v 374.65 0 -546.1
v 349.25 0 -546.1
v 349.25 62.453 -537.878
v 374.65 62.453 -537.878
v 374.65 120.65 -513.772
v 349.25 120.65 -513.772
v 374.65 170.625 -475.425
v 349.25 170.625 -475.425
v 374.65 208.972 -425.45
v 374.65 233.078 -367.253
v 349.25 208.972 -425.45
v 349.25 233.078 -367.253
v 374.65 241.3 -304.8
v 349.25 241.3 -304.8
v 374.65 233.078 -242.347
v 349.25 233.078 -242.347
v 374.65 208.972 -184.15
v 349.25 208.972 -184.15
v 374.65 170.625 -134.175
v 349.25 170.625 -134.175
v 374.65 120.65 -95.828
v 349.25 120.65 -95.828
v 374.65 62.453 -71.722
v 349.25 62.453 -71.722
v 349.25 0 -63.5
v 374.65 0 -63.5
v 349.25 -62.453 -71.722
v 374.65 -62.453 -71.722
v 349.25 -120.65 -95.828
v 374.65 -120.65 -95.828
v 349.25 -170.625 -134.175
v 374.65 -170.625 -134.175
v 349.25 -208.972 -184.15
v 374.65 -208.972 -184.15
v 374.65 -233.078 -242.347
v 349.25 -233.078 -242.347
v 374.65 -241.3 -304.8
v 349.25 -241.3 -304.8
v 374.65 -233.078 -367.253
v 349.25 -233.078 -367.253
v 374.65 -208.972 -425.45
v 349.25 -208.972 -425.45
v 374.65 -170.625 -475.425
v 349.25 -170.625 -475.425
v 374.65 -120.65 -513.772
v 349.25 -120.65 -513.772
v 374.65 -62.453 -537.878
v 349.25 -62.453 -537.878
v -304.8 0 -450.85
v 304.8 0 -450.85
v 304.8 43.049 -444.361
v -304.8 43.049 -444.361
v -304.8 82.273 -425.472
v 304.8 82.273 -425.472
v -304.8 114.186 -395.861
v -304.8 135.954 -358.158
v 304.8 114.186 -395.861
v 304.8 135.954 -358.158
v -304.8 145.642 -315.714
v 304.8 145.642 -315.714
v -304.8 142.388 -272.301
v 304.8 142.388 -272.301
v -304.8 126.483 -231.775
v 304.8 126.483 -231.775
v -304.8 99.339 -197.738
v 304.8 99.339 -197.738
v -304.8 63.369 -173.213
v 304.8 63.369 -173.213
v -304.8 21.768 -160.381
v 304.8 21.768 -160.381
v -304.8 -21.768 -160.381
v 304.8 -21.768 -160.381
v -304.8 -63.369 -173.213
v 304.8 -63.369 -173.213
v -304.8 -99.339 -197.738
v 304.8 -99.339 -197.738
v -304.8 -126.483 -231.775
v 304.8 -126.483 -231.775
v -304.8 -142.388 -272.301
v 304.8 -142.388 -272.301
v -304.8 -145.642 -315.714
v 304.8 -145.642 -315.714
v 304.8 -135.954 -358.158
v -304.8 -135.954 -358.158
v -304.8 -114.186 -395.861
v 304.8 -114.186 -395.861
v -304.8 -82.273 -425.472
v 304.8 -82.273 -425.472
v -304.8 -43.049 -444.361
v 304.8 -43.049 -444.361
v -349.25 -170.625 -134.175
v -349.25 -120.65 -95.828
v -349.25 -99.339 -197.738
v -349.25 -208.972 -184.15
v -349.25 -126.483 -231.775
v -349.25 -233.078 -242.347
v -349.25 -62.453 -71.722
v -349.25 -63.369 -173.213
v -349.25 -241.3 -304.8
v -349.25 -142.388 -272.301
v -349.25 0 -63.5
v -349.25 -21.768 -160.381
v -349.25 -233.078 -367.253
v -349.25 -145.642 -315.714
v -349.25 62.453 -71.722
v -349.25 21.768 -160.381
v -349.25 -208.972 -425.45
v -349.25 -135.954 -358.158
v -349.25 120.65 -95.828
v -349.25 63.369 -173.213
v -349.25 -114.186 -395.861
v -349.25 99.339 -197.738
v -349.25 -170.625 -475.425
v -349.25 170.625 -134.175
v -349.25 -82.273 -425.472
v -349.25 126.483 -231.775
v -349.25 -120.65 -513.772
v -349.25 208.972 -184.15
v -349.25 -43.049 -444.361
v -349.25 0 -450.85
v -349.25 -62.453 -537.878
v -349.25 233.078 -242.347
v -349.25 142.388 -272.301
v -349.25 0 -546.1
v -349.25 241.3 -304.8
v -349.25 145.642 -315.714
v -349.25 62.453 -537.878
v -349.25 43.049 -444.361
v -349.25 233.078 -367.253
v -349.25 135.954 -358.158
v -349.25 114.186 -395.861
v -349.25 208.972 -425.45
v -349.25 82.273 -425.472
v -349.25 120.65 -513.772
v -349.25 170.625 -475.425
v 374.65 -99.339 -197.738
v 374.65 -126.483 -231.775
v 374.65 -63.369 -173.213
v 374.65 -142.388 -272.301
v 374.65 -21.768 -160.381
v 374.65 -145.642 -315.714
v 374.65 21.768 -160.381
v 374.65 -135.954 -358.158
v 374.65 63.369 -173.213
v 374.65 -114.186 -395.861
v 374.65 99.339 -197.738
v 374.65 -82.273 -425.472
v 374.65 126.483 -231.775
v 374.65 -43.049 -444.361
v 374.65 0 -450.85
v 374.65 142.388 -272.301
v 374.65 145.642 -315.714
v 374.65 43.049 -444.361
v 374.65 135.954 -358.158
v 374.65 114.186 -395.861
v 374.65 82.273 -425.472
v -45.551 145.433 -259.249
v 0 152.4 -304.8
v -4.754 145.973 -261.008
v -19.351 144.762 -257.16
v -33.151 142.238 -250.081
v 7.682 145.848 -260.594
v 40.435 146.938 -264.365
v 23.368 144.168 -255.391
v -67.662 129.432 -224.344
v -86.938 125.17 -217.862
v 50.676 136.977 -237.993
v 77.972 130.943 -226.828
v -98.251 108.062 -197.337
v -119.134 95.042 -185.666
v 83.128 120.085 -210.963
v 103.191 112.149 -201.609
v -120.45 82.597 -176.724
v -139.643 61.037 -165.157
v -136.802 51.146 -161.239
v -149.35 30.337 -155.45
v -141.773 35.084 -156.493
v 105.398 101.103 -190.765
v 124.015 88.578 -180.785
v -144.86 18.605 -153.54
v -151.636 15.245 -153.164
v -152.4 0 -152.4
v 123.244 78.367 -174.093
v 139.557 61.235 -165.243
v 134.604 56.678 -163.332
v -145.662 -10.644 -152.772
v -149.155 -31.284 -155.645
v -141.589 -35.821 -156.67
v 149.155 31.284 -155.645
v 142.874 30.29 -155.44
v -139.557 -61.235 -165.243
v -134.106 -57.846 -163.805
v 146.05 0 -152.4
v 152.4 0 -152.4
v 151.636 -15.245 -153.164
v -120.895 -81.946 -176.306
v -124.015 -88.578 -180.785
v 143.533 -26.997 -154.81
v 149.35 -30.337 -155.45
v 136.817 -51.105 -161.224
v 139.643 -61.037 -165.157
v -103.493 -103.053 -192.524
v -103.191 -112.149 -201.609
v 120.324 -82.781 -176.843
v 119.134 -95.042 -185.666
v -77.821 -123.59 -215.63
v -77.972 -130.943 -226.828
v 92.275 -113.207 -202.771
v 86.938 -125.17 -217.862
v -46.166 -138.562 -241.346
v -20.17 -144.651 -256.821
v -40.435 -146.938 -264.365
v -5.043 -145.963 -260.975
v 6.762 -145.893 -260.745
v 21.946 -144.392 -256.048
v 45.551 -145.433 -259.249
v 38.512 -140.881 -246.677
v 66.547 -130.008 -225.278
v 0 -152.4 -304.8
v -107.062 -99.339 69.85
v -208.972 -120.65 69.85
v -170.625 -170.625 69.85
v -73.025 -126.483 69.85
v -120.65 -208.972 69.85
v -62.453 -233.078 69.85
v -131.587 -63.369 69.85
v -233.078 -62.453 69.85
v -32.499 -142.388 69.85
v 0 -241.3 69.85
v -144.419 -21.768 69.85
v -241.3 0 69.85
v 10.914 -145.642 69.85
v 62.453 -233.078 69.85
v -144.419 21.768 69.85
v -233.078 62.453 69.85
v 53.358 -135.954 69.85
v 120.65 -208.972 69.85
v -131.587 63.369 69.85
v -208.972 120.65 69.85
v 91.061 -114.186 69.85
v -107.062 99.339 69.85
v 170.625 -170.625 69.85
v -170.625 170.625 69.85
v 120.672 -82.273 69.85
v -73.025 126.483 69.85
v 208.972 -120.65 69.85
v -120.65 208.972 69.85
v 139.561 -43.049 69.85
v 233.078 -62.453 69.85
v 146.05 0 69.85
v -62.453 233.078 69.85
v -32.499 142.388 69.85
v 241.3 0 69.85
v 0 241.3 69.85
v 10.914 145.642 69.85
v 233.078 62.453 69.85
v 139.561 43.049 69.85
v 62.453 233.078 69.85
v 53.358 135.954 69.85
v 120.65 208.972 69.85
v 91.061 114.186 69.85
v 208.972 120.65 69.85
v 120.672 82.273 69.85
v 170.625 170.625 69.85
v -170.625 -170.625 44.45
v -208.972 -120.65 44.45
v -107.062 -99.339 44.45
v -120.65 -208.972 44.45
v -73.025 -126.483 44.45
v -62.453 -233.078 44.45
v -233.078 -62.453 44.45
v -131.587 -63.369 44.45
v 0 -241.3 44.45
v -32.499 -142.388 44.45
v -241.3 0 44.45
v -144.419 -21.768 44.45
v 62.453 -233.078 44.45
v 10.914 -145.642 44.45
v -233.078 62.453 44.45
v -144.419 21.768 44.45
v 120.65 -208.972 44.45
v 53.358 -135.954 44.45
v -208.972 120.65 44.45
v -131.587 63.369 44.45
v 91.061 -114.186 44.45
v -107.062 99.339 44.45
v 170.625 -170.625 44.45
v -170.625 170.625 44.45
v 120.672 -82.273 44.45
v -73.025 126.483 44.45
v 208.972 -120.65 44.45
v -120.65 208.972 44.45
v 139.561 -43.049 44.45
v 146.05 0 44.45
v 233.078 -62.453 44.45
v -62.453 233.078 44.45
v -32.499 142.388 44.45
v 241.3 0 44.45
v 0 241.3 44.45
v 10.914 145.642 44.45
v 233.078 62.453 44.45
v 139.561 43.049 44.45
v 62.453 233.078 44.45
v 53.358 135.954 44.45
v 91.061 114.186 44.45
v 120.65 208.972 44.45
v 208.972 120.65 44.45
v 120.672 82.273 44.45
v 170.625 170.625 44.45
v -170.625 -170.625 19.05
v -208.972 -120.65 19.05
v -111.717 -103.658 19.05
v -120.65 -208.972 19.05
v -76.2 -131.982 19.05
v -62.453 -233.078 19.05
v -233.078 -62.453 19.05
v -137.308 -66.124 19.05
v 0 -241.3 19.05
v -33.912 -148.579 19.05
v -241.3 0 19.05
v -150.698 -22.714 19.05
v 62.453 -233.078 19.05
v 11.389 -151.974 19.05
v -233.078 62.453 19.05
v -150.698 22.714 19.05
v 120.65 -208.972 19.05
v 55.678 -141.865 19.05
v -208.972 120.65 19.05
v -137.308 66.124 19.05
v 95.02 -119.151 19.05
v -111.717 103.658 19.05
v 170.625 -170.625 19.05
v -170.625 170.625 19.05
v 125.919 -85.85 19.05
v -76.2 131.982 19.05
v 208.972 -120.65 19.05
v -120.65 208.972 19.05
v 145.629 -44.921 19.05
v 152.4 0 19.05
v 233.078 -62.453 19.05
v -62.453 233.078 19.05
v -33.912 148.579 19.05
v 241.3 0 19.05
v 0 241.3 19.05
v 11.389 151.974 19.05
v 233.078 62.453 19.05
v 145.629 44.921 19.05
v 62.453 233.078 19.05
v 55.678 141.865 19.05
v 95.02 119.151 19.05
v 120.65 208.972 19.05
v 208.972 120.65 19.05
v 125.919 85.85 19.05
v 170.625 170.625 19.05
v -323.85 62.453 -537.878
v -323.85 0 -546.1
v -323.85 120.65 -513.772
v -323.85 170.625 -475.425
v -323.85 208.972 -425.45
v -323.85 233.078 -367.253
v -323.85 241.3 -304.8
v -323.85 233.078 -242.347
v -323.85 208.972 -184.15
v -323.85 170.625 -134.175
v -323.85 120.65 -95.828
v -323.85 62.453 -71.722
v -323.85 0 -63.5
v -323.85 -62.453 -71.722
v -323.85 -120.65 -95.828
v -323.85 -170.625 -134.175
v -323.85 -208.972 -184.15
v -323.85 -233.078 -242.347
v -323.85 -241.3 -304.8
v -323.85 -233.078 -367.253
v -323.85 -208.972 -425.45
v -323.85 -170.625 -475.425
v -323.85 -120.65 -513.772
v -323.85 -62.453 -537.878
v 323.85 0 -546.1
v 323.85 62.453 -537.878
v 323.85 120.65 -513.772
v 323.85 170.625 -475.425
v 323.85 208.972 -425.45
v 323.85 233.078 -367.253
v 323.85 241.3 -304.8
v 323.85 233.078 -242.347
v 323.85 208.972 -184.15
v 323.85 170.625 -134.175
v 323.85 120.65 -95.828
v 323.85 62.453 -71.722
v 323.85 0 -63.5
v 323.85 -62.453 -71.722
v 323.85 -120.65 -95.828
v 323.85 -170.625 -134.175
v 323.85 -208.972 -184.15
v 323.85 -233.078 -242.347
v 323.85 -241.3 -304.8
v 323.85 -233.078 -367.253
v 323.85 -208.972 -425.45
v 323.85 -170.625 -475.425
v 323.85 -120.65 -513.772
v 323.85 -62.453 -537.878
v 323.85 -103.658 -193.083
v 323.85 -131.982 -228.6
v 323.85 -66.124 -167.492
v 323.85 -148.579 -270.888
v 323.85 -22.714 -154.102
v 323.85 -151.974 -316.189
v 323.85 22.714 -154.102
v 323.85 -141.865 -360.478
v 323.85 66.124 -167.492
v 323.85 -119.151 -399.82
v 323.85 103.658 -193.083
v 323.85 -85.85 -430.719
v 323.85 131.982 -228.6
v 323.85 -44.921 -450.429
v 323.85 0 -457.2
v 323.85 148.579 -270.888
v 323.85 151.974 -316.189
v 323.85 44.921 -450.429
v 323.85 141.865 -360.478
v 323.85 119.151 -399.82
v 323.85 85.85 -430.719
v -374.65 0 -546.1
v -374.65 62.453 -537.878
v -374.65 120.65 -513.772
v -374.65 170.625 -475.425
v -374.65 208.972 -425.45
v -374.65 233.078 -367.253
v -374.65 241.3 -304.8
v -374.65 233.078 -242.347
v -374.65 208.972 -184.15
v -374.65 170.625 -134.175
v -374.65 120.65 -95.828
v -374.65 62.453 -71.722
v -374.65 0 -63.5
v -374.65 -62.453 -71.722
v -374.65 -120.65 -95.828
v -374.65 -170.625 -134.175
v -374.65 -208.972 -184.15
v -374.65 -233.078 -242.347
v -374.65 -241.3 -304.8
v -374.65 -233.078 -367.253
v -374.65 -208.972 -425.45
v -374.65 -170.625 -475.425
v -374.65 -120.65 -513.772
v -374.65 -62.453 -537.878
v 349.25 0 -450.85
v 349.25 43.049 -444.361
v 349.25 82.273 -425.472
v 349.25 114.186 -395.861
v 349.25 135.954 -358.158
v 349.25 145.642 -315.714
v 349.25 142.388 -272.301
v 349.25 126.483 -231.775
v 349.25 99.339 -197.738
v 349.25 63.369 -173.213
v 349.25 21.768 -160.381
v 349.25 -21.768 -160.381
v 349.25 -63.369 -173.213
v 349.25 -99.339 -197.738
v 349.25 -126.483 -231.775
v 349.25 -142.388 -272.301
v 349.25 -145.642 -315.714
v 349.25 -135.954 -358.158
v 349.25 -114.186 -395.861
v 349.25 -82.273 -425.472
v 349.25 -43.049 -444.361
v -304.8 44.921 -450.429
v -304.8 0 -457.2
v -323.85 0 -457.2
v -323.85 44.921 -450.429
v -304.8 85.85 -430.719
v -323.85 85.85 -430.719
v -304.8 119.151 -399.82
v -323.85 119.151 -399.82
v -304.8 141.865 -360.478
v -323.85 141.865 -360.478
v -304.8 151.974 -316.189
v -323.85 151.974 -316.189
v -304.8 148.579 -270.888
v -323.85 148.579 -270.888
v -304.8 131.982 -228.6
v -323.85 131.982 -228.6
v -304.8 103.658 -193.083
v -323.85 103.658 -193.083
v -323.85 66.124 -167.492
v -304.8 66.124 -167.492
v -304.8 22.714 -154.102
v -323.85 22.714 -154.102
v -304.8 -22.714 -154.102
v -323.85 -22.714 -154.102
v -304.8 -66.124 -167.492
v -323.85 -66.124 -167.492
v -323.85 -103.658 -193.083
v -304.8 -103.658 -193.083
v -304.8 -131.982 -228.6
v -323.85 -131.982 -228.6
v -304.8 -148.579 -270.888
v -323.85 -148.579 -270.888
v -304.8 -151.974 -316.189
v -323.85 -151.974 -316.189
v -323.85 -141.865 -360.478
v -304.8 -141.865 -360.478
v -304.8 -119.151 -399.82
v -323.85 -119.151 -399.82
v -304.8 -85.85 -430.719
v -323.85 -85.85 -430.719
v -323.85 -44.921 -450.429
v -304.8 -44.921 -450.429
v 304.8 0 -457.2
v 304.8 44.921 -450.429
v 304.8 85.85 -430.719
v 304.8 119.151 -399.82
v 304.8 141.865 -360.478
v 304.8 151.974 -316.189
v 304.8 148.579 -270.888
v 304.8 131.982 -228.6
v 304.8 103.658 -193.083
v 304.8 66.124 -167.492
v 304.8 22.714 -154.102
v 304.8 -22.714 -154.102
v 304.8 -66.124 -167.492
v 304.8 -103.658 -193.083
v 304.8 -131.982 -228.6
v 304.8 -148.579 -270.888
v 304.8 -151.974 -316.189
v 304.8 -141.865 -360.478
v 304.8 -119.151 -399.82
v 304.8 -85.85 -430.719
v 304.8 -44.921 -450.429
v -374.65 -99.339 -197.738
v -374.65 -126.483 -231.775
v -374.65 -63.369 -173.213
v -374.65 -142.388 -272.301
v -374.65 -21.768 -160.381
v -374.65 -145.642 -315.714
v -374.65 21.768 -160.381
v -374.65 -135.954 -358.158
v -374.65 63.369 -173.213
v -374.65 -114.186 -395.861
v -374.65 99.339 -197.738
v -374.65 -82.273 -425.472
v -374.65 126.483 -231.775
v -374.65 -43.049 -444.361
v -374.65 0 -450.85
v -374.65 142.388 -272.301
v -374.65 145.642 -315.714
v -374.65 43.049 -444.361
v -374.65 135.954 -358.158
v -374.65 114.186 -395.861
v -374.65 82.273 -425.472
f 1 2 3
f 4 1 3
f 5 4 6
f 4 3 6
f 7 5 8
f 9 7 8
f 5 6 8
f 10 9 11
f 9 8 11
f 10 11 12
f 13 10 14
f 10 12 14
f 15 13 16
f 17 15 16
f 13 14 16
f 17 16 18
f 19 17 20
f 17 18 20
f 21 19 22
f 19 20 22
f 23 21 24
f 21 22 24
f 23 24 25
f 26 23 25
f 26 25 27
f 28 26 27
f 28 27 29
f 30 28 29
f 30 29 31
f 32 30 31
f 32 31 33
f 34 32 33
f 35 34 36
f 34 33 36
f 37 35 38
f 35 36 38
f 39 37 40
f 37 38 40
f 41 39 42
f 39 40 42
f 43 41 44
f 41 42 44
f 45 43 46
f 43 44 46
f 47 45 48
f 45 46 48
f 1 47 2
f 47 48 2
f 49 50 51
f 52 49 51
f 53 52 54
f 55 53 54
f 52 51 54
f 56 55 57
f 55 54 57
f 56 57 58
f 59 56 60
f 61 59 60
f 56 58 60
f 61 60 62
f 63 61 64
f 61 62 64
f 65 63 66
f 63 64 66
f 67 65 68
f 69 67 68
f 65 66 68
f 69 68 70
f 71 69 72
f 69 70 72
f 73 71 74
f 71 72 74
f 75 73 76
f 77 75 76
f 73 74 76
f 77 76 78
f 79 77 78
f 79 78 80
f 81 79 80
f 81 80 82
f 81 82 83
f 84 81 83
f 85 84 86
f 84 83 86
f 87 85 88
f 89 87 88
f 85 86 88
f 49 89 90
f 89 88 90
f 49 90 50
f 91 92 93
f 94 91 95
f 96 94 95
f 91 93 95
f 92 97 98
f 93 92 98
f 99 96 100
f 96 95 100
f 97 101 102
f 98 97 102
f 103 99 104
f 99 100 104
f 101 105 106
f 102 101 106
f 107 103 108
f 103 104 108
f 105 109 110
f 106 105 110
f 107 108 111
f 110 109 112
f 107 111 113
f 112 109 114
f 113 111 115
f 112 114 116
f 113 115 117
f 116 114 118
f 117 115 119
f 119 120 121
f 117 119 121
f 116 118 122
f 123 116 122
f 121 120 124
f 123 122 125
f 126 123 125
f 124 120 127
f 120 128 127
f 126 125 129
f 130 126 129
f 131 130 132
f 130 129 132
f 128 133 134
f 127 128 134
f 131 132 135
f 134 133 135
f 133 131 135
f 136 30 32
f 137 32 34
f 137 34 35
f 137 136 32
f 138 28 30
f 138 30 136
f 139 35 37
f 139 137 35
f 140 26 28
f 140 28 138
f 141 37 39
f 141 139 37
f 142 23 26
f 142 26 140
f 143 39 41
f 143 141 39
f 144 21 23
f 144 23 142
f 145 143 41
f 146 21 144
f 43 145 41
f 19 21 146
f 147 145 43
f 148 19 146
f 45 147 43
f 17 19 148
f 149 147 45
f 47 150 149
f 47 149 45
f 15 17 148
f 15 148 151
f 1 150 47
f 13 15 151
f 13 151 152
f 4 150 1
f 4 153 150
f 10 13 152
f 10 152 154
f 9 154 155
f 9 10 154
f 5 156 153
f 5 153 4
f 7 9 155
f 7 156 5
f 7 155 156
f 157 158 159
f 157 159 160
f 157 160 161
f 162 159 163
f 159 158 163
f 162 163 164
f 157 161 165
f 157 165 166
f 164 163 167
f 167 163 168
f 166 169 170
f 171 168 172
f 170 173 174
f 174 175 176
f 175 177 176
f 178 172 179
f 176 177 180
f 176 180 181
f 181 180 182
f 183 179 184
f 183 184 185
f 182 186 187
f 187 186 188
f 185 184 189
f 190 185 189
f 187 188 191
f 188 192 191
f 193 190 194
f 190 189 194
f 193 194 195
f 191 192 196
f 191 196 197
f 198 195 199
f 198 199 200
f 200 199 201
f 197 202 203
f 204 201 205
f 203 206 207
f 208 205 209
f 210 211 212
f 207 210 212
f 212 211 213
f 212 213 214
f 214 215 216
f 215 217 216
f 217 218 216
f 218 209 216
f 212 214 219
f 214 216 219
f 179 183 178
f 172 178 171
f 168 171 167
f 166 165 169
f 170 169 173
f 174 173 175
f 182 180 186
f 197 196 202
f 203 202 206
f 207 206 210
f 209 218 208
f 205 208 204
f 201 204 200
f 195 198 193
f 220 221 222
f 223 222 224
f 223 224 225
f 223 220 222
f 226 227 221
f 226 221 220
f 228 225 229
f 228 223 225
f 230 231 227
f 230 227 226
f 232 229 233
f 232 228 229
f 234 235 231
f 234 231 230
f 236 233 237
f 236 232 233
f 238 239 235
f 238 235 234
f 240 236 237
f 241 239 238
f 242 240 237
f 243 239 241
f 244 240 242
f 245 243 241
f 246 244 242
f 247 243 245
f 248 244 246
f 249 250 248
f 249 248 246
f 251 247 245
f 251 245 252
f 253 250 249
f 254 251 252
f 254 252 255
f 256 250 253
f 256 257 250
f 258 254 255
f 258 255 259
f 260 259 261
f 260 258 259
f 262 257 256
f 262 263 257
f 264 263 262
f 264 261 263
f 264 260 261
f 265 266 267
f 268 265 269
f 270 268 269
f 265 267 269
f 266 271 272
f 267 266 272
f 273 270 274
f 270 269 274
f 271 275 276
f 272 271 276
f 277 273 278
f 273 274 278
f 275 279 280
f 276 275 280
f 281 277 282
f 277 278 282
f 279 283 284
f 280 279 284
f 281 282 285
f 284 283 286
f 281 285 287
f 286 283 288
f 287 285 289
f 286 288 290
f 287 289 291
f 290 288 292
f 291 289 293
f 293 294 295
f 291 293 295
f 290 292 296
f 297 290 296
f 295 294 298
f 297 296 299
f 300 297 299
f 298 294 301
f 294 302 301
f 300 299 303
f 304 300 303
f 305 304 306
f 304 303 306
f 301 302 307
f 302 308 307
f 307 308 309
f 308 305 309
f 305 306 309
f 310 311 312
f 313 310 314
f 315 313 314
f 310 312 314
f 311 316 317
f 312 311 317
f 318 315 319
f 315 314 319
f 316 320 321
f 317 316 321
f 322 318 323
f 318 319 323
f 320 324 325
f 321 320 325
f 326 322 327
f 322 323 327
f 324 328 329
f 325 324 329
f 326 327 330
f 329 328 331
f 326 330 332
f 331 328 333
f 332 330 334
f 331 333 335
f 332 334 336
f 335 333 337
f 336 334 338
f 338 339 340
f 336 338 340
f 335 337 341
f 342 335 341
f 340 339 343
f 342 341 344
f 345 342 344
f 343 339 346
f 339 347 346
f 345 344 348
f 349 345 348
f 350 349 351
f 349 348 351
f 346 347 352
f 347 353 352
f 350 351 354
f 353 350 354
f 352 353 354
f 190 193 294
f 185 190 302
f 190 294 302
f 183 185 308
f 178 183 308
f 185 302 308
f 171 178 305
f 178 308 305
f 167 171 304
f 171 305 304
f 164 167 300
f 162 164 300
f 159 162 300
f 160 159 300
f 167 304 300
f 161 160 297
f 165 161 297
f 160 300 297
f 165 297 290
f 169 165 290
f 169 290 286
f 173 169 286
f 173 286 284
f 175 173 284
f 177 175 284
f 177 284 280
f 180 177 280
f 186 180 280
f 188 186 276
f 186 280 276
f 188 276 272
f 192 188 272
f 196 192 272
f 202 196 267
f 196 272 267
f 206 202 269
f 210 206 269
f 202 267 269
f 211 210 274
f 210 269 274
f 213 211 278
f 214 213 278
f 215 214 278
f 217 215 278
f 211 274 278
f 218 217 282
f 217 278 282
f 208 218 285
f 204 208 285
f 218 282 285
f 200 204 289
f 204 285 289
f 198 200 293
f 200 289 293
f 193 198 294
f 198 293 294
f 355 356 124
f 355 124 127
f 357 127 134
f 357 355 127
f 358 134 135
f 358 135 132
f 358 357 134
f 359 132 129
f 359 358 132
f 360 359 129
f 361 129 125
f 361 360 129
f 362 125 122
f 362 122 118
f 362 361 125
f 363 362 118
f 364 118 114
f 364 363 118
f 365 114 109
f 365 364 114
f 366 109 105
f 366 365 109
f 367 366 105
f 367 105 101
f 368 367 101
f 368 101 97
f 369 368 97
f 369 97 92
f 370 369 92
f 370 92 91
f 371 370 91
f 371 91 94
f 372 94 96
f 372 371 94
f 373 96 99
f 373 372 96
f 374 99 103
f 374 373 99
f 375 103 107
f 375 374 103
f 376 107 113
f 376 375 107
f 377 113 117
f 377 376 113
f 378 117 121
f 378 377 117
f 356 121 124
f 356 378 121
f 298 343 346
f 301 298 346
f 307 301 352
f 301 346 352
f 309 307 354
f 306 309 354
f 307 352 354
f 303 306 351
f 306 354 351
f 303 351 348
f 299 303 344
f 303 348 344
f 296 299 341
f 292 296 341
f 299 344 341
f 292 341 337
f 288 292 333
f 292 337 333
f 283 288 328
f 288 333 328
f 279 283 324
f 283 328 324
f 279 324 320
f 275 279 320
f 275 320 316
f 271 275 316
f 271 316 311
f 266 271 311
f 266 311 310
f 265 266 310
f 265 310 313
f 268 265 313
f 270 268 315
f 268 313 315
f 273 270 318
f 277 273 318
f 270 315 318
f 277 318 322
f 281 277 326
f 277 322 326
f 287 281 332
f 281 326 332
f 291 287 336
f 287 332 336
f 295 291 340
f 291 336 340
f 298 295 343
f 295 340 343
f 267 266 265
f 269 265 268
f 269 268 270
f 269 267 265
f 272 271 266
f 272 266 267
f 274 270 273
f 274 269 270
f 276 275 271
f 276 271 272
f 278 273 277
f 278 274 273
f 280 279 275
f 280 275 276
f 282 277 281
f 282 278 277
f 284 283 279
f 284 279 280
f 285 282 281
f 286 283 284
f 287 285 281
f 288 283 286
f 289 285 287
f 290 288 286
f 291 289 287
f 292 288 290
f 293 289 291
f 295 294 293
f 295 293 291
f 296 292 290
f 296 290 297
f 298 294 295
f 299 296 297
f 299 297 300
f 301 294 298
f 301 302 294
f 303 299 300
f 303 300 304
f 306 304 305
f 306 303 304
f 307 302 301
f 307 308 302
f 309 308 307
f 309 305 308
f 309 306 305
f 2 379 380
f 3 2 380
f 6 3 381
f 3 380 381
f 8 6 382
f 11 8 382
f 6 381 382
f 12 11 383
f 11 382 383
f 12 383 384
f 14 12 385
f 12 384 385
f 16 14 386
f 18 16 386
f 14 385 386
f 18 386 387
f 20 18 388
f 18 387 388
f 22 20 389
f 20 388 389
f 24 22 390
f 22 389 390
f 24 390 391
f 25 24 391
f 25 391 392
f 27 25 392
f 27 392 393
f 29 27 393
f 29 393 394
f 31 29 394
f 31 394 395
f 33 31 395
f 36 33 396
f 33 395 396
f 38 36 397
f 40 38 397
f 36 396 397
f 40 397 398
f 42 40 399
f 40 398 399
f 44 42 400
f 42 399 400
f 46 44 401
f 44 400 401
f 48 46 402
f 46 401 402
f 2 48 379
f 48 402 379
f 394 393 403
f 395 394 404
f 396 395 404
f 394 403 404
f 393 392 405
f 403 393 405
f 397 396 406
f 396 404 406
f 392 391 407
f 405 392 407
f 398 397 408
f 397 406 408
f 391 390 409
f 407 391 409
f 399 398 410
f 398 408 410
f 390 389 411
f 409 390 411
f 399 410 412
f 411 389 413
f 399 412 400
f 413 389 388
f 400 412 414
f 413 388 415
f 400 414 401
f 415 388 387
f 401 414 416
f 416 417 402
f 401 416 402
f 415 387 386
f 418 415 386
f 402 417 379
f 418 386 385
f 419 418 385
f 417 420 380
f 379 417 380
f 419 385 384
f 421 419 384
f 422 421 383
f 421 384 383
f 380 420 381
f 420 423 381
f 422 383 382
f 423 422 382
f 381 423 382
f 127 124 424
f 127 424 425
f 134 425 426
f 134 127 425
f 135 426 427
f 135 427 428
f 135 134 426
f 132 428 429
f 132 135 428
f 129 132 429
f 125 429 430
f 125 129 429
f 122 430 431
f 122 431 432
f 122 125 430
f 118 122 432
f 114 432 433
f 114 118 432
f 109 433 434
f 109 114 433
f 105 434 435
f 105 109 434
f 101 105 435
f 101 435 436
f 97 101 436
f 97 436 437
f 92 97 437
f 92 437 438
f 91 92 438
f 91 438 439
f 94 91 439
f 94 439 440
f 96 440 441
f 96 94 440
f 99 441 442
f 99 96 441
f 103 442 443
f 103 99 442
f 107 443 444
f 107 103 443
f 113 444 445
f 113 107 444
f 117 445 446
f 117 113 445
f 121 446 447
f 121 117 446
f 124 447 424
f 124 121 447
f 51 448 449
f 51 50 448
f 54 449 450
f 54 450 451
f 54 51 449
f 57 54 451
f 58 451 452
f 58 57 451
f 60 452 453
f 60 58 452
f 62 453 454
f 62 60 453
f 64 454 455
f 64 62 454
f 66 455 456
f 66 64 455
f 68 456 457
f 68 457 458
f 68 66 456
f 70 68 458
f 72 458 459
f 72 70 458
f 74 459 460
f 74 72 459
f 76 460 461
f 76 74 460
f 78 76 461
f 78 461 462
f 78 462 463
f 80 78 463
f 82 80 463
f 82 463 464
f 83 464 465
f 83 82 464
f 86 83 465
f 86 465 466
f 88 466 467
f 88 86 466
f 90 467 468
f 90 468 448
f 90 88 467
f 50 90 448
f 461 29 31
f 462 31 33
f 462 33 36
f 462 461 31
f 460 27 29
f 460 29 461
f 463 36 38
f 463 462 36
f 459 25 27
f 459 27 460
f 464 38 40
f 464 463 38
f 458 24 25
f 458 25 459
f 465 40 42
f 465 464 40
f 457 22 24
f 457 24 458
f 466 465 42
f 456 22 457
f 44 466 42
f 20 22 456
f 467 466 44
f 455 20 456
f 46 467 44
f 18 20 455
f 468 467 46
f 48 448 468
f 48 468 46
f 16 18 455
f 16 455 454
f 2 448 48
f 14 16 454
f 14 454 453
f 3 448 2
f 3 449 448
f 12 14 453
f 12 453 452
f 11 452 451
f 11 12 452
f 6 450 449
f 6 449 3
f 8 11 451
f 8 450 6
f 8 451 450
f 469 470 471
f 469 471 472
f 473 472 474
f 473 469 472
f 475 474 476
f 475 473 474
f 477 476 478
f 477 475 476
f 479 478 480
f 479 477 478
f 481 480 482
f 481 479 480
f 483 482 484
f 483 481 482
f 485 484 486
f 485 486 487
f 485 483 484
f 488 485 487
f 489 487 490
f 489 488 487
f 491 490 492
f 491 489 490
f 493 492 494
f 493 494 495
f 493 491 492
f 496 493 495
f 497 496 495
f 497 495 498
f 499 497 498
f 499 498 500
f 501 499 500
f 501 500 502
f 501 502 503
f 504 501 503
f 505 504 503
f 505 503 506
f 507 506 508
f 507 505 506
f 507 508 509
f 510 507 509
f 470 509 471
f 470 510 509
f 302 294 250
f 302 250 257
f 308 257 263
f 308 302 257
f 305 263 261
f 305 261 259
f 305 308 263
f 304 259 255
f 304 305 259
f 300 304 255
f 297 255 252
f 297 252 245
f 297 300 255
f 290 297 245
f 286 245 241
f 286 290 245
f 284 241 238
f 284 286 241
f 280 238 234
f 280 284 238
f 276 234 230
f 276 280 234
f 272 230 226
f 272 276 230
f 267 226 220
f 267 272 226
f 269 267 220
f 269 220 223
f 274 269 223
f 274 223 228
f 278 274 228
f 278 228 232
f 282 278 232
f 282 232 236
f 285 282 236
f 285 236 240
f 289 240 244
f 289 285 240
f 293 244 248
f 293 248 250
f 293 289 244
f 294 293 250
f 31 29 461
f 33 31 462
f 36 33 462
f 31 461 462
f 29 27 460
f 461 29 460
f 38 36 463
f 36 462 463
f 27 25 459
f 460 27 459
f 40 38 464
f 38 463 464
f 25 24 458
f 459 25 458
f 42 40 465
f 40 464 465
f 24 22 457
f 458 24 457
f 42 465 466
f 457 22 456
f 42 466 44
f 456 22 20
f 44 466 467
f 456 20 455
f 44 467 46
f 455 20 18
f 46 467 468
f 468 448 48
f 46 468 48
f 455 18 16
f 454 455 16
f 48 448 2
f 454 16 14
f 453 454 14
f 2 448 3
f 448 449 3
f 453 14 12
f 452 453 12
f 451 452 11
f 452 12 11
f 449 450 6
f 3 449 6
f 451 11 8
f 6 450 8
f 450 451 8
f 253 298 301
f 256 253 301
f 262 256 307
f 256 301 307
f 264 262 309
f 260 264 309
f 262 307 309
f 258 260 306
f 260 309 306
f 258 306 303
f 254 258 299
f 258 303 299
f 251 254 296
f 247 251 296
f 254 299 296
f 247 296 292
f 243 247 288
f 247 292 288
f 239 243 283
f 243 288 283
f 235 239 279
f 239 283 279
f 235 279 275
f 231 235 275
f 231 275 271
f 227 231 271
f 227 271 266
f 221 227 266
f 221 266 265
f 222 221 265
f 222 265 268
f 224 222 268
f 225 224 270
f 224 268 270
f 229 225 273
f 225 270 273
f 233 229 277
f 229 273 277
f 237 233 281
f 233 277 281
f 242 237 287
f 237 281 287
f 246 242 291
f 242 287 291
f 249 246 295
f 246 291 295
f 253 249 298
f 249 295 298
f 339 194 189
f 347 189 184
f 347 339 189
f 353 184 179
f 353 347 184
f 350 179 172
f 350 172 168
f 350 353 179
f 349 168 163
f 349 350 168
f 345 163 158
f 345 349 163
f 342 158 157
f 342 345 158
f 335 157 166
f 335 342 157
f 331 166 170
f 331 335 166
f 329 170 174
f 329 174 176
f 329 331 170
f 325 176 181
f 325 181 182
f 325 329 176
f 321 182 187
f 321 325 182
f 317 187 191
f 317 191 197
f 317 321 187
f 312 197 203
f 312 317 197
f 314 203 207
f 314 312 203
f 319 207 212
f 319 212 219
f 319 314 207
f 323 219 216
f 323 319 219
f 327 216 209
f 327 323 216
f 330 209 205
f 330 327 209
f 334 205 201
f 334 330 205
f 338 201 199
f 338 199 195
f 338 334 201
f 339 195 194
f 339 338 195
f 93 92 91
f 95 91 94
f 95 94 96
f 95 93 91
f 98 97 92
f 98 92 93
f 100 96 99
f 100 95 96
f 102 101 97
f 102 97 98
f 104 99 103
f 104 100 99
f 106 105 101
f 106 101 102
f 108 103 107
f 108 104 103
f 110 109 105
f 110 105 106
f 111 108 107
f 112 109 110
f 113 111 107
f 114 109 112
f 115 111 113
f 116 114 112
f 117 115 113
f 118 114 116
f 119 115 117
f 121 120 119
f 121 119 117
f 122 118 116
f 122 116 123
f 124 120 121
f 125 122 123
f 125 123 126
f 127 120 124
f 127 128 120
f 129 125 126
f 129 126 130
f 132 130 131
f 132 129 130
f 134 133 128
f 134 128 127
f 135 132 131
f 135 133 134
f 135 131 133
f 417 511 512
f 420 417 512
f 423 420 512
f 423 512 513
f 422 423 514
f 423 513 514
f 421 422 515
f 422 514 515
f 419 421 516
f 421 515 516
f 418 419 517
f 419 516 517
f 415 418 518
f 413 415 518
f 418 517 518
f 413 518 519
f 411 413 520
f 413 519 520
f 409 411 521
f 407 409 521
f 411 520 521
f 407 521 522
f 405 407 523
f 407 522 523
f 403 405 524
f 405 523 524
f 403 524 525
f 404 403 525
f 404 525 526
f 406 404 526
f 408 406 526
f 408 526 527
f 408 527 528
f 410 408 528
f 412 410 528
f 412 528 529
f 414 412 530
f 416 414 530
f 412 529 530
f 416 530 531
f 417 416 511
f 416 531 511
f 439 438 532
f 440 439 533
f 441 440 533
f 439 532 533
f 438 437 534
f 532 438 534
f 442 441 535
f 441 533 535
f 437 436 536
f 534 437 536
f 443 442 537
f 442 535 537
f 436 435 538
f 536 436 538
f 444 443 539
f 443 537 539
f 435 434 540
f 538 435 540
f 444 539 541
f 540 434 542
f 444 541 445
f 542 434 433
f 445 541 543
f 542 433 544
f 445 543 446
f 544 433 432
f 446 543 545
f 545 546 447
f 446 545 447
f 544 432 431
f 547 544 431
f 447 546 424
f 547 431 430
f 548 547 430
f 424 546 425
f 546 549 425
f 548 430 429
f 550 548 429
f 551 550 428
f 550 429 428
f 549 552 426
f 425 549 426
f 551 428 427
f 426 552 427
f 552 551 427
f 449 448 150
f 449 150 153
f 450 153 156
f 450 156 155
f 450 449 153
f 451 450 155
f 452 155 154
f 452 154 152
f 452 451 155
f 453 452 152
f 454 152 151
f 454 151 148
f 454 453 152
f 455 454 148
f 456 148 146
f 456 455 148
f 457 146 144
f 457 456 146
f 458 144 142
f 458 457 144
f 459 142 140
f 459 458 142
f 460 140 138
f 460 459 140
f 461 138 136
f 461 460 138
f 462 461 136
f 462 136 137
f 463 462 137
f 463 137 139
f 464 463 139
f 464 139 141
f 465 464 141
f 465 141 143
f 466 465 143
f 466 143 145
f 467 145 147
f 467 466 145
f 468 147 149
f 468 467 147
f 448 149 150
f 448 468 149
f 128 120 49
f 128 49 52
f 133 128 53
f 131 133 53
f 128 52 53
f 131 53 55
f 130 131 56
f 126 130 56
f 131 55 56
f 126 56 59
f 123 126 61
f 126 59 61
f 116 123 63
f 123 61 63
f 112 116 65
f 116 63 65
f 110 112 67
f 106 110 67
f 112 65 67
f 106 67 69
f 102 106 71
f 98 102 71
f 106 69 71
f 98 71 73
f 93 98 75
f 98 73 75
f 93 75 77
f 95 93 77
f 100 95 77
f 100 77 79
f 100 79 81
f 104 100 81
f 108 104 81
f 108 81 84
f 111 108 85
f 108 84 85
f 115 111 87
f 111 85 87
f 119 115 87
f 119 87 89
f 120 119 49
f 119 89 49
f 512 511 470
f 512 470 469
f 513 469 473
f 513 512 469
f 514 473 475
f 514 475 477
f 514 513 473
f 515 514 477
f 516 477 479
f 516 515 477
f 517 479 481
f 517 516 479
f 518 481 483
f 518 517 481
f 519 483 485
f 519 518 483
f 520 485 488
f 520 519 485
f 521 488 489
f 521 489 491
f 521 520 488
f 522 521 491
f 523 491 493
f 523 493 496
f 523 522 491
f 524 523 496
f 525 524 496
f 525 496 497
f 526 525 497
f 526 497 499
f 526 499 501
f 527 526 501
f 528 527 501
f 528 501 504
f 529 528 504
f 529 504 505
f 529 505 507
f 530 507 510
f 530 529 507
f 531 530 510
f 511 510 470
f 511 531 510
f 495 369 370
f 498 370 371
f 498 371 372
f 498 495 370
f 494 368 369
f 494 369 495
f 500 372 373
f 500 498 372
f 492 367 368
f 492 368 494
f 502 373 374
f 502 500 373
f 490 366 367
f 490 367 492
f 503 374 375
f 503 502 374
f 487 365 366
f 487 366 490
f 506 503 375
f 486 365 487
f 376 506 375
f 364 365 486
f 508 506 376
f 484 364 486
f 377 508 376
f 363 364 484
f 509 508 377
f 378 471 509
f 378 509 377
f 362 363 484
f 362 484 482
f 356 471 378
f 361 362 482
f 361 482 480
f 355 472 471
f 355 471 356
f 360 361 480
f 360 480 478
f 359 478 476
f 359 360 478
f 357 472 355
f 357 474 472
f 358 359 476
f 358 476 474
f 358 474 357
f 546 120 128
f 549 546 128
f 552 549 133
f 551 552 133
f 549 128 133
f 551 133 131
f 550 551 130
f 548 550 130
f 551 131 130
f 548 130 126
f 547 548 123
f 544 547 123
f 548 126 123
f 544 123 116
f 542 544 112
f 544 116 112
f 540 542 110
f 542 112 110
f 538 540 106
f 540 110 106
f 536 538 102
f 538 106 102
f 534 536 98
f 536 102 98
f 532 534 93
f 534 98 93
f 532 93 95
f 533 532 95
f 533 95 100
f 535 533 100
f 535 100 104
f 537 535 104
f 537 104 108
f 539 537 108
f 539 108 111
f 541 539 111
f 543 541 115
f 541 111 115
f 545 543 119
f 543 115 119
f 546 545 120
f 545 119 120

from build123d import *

# Parameters (mm, degrees)
F0_R      = 152.4
F0_R_2    = 146.05
F1_DEPTH  = 19.05
F2_R      = 241.3
F2_R_2    = 152.4
F2_R_3    = 146.05
F3_DEPTH  = 25.4
F9_ANGLE  = 90
F11_DEPTH = 609.6
F12_REACH = 977.1532938113
F13_DEPTH = 25.4
F14_DEPTH = 25.4
F15_DEPTH = 25.4


with BuildPart() as f1:
    # F0 (on Top) → F1 (new body)
    with BuildSketch(Plane.XY):
        Circle(F0_R)
        Circle(F0_R_2, mode=Mode.SUBTRACT)
    extrude(amount=F1_DEPTH)

    # F2 (on face) → F3 (join)
    with BuildSketch(Plane.XY.offset(19.05)):
        Circle(F2_R)
        Circle(F2_R_2, mode=Mode.SUBTRACT)
        Circle(F2_R_2)
        Circle(F2_R_3, mode=Mode.SUBTRACT)
    extrude(amount=F3_DEPTH)


with BuildPart() as f7_1:
    # F7: copy of F1
    add(f1.part.moved(Location((304.8, 0, -304.8))))


with BuildPart() as f7_1_1:
    # F9: moved
    add(f7_1.part.rotate(Axis((304.8, 122.1911609173, -304.8), (0, 1, 0)), F9_ANGLE))


with BuildPart() as f10_1:
    # F10: instance of F7_1
    add(f7_1_1.part.mirror(Plane.YZ))


with BuildPart() as f7_1_2:
    add(f7_1_1.part)

    # F11 (add, through all): a face of the model
    f11_faces = [f7_1_2.faces().sort_by_distance(p)[0] for p in [
        (304.8, 0, -156.7105229381),
    ]]

    add(f10_1.part)  # F11 merges F10_1
    extrude(f11_faces, amount=F11_DEPTH)


with BuildPart() as f1_1:
    add(f1.part)

    f12_end = f7_1_2.part.faces().sort_by_distance((0, 0, -152.4))[0]
    # F0 (on Top) → F12 (join, up to a face of F7_1 that its end follows)
    with BuildSketch(Plane.XY):
        Circle(F0_R)
        Circle(F0_R_2, mode=Mode.SUBTRACT)
    f12_long = extrude(amount=-F12_REACH, mode=Mode.PRIVATE)
    add(split(f12_long, bisect_by=f12_end, keep=Keep.ALL, mode=Mode.PRIVATE).solids().sort_by_distance((-148.0894770619, 0, 0))[0])


with BuildPart() as f13:
    # F13 (new): a face of the model
    f13_faces = [f7_1_2.part.faces().sort_by_distance(p)[0] for p in [
        (349.25, 0, -70.324994652),
    ]]
    extrude(f13_faces, amount=F13_DEPTH)


with BuildPart() as f14:
    # F14 (new): a face of the model
    f14_faces = [f7_1_2.part.faces().sort_by_distance(p)[0] for p in [
        (-349.25, 0, -70.324994652),
    ]]
    extrude(f14_faces, amount=F14_DEPTH)


with BuildPart() as f15:
    # F15 (new): a face of the model
    f15_faces = [f1_1.part.faces().sort_by_distance(p)[0] for p in [
        (-234.475005348, 0, 44.45),
    ]]
    extrude(f15_faces, amount=F15_DEPTH)


solid = Compound([f7_1_2.part, f1_1.part, f13.part, f14.part, f15.part])
